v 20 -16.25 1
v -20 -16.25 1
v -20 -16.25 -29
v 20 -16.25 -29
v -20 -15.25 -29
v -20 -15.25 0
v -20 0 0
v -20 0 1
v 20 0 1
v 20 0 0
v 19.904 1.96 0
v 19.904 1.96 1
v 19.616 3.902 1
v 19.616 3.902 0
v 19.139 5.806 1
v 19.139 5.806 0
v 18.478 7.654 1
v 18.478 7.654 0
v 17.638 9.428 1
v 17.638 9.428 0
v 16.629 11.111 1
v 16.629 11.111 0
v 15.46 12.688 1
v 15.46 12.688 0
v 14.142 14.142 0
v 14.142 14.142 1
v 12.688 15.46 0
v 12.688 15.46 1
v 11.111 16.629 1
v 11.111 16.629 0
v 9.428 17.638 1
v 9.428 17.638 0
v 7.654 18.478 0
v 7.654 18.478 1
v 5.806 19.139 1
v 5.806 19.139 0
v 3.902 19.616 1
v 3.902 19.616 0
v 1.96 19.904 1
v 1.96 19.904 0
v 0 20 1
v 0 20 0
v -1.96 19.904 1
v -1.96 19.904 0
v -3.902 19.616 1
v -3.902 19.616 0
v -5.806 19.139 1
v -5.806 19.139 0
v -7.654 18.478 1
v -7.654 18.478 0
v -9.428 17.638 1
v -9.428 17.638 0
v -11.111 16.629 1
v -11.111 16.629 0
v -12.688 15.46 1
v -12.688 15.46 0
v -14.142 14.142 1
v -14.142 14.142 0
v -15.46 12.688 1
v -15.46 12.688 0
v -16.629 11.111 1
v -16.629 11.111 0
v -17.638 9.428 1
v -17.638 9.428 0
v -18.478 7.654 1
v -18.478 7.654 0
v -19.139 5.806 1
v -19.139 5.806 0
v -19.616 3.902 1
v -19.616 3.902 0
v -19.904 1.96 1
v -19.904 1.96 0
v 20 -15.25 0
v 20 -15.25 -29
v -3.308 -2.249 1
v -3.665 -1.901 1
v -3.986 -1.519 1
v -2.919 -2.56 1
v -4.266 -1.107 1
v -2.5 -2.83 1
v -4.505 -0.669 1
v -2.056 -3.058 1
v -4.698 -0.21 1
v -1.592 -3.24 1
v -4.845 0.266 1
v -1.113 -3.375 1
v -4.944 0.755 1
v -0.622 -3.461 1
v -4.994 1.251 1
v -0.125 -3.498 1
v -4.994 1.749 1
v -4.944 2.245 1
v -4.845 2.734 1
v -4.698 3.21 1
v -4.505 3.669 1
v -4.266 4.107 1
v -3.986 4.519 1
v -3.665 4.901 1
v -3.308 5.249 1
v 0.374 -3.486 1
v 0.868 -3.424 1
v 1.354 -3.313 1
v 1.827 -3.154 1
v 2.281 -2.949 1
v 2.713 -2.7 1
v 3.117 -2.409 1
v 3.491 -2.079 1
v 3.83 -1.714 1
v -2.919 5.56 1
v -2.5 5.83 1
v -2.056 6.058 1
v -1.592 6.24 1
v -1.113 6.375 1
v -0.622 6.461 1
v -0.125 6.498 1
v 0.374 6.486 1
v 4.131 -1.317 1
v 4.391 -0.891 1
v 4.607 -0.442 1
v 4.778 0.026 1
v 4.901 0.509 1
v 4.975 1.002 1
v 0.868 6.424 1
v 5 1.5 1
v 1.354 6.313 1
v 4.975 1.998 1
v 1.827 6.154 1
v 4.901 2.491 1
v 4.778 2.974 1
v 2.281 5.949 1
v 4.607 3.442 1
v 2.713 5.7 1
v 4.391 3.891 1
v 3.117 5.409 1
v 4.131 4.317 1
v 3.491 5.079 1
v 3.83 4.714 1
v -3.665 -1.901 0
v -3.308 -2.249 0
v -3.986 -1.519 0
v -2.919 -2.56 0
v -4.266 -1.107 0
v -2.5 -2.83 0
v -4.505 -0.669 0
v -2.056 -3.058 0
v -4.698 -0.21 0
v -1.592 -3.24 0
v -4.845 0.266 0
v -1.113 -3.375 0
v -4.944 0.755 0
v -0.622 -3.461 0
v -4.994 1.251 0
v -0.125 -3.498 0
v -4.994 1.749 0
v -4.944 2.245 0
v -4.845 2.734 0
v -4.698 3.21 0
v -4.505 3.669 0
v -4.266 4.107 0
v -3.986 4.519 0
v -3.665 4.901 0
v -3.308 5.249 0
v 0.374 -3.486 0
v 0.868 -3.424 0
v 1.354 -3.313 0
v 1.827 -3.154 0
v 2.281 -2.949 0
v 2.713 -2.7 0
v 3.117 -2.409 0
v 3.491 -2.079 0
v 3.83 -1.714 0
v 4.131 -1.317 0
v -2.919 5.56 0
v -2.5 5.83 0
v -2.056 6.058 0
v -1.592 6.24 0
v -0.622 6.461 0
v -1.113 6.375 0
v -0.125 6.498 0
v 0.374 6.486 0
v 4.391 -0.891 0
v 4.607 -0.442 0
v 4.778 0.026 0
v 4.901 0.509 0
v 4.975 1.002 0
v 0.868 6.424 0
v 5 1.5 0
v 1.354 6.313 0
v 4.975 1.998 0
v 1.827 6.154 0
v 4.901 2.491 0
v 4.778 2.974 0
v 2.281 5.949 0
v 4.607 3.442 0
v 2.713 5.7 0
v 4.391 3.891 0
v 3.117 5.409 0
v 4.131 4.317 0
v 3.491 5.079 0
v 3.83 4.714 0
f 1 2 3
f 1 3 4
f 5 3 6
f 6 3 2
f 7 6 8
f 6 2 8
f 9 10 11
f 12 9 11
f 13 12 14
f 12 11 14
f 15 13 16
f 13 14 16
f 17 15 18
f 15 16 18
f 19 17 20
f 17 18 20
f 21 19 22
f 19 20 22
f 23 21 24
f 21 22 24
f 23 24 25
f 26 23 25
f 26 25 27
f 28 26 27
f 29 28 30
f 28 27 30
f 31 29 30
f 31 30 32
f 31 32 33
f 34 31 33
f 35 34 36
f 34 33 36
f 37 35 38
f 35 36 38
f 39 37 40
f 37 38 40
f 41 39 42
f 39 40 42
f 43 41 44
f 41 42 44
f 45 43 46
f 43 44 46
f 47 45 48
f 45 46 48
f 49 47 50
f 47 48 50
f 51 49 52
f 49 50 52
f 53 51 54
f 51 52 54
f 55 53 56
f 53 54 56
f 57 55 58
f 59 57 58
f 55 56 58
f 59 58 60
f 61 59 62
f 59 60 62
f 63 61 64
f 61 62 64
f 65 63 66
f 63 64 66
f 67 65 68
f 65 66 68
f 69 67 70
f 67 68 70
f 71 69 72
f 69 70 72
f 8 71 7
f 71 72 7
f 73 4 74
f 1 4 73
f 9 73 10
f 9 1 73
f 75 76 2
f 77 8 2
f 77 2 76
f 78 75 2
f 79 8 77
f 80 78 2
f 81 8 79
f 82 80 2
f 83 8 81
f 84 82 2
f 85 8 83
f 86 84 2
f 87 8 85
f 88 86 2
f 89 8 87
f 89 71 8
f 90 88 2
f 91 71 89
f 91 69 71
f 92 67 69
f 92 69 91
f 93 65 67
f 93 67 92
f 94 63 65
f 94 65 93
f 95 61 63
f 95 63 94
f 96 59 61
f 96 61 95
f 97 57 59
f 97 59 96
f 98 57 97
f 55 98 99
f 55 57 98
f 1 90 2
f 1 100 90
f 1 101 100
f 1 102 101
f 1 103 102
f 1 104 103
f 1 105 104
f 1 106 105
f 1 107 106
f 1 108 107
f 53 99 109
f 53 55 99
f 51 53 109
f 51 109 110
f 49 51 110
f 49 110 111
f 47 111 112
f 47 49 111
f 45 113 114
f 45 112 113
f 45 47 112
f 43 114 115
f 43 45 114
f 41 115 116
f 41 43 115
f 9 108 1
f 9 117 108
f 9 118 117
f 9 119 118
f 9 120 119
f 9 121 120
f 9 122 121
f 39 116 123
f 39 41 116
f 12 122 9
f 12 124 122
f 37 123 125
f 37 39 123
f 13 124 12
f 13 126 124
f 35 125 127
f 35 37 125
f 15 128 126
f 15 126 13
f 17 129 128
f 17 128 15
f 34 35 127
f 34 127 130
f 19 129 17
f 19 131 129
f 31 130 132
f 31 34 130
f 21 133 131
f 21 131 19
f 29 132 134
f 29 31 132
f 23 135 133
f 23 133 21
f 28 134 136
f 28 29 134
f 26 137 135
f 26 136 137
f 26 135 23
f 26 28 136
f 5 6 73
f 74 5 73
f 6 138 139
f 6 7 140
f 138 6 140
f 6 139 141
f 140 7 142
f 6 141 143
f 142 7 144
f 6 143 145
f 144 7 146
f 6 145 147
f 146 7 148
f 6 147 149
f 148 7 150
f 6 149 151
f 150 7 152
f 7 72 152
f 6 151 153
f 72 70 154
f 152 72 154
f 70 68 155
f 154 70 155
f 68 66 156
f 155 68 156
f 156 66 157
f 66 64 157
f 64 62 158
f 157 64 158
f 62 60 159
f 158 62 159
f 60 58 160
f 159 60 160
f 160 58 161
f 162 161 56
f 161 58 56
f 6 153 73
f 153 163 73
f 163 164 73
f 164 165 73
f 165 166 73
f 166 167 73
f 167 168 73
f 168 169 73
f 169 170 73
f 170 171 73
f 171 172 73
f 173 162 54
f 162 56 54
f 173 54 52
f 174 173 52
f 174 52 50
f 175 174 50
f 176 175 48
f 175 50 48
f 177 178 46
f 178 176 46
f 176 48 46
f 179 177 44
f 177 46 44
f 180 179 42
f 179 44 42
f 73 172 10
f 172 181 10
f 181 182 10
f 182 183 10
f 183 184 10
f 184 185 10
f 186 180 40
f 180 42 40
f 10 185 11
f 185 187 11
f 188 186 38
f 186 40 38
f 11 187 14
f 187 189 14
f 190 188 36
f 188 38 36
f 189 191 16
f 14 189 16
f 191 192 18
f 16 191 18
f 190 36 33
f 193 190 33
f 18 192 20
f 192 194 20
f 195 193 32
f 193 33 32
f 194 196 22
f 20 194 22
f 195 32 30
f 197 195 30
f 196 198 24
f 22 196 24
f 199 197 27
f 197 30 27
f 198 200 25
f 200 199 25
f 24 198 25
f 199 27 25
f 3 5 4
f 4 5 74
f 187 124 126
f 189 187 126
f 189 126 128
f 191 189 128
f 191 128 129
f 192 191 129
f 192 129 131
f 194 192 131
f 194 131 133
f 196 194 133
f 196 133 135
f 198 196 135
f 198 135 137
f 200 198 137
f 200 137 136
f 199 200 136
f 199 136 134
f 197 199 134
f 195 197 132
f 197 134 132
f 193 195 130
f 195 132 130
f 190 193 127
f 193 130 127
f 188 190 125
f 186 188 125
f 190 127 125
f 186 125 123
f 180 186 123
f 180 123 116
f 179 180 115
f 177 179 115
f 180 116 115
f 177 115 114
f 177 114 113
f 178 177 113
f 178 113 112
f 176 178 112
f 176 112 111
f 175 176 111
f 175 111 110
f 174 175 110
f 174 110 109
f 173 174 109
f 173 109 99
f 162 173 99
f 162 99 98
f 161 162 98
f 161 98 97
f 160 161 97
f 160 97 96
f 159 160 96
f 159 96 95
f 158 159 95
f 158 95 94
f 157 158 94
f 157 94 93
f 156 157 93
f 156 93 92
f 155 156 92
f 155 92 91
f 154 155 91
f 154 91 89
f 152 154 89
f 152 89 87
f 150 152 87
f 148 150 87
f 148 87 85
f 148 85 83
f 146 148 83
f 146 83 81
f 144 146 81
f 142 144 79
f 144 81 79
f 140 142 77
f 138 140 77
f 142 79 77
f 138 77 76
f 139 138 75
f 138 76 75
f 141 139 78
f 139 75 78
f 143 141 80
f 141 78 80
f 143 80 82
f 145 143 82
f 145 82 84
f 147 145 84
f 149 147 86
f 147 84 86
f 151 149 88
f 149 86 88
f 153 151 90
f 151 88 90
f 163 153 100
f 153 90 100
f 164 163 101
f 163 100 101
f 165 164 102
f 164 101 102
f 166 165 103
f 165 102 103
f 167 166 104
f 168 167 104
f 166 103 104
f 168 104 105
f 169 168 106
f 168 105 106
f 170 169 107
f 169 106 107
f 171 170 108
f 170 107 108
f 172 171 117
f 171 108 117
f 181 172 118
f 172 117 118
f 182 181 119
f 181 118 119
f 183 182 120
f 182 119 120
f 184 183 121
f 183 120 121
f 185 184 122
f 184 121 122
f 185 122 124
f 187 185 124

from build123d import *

# Parameters (mm, degrees)
BOSS_EXTRUDE1_DEPTH = 1
SKETCH4_W           = 40
SKETCH4_H           = 1
BOSS_EXTRUDE2_DEPTH = 30
SKETCH5_R           = 5
CUT_EXTRUDE1_DEPTH  = 47


with BuildPart() as part:
    # Sketch3 → Boss-Extrude1 (new body)
    with BuildSketch(Plane.XY):
        with BuildLine():
            Line((-20, 0), (-20, -15.25))
            Line((-20, -15.25), (20, -15.25))
            Line((20, -15.25), (20, 0))
            ThreePointArc((20, 0), (0, 20), (-20, 0))
        make_face()
    extrude(amount=BOSS_EXTRUDE1_DEPTH)

    # Sketch4 → Boss-Extrude2 (add)
    with BuildSketch(Plane.XY.offset(1)):
        with Locations((0, -15.75)):
            Rectangle(SKETCH4_W, SKETCH4_H)
    extrude(amount=-BOSS_EXTRUDE2_DEPTH)

    # Sketch5 → Cut-Extrude1 (cut)
    with BuildSketch(Plane.XY.offset(1)):
        with Locations((0, 1.5)):
            Circle(SKETCH5_R)
    extrude(amount=-CUT_EXTRUDE1_DEPTH, mode=Mode.SUBTRACT)


solid = part.part
